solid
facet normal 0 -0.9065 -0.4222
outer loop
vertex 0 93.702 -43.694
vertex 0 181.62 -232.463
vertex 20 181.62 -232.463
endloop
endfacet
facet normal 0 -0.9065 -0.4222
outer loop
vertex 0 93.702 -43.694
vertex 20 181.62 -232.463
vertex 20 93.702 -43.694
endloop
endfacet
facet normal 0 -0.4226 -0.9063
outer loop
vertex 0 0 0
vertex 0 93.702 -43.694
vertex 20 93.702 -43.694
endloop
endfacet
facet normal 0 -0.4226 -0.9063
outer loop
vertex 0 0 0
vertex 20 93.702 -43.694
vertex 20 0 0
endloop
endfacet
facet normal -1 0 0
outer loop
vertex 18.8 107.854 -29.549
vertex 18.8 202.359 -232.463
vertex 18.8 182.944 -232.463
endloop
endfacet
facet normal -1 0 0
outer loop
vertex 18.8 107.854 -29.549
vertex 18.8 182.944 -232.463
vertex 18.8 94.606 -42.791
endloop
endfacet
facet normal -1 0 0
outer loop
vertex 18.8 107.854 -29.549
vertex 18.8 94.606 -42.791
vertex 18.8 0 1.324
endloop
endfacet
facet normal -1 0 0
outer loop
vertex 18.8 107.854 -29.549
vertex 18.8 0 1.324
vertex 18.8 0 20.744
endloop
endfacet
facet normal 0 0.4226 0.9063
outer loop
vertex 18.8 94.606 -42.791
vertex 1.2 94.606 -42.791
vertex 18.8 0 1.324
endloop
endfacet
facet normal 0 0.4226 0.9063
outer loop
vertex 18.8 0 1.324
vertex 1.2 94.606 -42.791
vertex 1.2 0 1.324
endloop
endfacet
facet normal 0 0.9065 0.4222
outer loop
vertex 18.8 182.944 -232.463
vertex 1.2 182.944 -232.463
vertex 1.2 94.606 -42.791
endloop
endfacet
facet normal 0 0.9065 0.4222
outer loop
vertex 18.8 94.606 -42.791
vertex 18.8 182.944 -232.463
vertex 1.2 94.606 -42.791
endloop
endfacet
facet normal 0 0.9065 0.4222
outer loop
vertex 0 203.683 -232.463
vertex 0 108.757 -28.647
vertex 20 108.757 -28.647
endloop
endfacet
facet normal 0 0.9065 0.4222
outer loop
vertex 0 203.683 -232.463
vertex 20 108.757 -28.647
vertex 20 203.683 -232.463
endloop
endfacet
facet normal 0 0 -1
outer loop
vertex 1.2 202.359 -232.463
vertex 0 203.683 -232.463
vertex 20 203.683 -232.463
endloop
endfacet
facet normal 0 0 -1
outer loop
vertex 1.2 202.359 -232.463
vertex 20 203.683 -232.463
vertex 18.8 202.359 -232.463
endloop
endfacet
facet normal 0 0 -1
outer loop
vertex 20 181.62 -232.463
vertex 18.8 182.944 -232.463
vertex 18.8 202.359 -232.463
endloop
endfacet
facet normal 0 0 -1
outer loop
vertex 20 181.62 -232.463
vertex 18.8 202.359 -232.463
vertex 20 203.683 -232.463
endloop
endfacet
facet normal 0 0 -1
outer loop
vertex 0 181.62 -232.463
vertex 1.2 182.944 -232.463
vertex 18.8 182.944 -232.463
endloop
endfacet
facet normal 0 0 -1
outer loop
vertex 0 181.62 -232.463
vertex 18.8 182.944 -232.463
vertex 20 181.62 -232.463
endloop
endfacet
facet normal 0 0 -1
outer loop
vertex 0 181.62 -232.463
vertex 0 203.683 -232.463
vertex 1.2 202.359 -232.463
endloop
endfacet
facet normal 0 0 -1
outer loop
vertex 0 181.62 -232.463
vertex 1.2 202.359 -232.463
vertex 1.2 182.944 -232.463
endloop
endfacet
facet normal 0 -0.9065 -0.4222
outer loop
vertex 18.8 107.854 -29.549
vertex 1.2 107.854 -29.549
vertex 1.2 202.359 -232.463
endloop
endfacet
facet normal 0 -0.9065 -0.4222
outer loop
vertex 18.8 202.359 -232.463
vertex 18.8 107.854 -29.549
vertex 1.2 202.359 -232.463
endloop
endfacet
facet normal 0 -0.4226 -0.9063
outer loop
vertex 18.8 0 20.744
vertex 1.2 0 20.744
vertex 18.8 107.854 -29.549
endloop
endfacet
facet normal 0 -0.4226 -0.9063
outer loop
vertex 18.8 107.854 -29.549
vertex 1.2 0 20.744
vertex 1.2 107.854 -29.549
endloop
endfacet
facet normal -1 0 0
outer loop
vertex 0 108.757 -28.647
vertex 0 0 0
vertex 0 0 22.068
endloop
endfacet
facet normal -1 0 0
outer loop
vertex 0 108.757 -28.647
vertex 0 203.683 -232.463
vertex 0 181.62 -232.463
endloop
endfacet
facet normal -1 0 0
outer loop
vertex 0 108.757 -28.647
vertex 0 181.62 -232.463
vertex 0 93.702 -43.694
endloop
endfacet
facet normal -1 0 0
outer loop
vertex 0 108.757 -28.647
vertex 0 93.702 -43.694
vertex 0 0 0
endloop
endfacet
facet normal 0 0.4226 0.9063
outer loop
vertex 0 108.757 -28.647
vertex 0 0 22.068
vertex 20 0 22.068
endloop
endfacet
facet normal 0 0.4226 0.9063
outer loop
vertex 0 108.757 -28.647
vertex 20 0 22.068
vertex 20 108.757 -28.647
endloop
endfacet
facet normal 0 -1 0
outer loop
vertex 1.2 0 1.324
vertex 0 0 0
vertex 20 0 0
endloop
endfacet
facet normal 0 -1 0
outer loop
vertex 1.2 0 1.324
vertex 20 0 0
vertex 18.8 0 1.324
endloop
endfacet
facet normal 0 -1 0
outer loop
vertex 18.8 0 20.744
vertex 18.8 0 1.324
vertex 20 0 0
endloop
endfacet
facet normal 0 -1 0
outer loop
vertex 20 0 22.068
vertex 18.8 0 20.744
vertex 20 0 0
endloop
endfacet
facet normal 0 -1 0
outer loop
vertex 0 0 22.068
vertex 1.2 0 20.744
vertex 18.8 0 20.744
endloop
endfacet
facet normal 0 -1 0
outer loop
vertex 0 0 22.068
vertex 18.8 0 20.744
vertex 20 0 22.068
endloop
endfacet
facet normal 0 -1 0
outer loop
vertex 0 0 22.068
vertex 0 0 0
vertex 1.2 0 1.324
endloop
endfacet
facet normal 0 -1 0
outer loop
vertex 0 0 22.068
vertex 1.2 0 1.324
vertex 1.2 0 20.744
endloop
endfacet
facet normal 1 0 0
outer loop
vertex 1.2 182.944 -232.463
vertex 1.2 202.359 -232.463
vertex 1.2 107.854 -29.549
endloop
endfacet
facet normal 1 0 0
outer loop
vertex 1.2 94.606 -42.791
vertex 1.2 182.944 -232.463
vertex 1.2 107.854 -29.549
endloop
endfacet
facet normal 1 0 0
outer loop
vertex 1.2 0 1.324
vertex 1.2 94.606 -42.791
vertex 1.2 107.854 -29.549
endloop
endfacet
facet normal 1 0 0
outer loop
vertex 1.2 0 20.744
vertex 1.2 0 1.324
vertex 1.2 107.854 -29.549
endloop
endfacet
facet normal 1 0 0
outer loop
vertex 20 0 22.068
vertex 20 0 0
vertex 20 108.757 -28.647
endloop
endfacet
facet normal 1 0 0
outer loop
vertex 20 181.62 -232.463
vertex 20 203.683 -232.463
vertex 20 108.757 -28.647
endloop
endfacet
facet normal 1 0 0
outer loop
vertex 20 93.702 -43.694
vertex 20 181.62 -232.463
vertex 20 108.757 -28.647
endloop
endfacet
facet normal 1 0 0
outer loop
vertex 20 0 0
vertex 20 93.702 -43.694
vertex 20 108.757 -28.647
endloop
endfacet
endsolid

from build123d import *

# Parameters (mm, degrees)
BOSS_EXTRUDE1_DEPTH = 20
SHELL1_T            = -1.2


with BuildPart() as part:
    # Sketch2 → Boss-Extrude1 (new body)
    with BuildSketch(Plane(origin=(0, 0, 0), x_dir=(0, 0, -1), z_dir=(1, 0, 0))):
        Polygon((0, 0), (-22.067558379, 0), (28.64663303, 108.756934444), (232.463172314, 203.682917329), (232.463172314, 181.620135221), (43.694156178, 93.70242031), align=None)
    extrude(amount=BOSS_EXTRUDE1_DEPTH)

    # Shell1
    shell1_openings = [part.faces().sort_by_distance(p)[0] for p in [
        (10, 0, 11.03377919),
        (10, 192.651526275, -232.463172314),
    ]]
    offset(amount=SHELL1_T, openings=shell1_openings, kind=Kind.INTERSECTION)


solid = part.part
